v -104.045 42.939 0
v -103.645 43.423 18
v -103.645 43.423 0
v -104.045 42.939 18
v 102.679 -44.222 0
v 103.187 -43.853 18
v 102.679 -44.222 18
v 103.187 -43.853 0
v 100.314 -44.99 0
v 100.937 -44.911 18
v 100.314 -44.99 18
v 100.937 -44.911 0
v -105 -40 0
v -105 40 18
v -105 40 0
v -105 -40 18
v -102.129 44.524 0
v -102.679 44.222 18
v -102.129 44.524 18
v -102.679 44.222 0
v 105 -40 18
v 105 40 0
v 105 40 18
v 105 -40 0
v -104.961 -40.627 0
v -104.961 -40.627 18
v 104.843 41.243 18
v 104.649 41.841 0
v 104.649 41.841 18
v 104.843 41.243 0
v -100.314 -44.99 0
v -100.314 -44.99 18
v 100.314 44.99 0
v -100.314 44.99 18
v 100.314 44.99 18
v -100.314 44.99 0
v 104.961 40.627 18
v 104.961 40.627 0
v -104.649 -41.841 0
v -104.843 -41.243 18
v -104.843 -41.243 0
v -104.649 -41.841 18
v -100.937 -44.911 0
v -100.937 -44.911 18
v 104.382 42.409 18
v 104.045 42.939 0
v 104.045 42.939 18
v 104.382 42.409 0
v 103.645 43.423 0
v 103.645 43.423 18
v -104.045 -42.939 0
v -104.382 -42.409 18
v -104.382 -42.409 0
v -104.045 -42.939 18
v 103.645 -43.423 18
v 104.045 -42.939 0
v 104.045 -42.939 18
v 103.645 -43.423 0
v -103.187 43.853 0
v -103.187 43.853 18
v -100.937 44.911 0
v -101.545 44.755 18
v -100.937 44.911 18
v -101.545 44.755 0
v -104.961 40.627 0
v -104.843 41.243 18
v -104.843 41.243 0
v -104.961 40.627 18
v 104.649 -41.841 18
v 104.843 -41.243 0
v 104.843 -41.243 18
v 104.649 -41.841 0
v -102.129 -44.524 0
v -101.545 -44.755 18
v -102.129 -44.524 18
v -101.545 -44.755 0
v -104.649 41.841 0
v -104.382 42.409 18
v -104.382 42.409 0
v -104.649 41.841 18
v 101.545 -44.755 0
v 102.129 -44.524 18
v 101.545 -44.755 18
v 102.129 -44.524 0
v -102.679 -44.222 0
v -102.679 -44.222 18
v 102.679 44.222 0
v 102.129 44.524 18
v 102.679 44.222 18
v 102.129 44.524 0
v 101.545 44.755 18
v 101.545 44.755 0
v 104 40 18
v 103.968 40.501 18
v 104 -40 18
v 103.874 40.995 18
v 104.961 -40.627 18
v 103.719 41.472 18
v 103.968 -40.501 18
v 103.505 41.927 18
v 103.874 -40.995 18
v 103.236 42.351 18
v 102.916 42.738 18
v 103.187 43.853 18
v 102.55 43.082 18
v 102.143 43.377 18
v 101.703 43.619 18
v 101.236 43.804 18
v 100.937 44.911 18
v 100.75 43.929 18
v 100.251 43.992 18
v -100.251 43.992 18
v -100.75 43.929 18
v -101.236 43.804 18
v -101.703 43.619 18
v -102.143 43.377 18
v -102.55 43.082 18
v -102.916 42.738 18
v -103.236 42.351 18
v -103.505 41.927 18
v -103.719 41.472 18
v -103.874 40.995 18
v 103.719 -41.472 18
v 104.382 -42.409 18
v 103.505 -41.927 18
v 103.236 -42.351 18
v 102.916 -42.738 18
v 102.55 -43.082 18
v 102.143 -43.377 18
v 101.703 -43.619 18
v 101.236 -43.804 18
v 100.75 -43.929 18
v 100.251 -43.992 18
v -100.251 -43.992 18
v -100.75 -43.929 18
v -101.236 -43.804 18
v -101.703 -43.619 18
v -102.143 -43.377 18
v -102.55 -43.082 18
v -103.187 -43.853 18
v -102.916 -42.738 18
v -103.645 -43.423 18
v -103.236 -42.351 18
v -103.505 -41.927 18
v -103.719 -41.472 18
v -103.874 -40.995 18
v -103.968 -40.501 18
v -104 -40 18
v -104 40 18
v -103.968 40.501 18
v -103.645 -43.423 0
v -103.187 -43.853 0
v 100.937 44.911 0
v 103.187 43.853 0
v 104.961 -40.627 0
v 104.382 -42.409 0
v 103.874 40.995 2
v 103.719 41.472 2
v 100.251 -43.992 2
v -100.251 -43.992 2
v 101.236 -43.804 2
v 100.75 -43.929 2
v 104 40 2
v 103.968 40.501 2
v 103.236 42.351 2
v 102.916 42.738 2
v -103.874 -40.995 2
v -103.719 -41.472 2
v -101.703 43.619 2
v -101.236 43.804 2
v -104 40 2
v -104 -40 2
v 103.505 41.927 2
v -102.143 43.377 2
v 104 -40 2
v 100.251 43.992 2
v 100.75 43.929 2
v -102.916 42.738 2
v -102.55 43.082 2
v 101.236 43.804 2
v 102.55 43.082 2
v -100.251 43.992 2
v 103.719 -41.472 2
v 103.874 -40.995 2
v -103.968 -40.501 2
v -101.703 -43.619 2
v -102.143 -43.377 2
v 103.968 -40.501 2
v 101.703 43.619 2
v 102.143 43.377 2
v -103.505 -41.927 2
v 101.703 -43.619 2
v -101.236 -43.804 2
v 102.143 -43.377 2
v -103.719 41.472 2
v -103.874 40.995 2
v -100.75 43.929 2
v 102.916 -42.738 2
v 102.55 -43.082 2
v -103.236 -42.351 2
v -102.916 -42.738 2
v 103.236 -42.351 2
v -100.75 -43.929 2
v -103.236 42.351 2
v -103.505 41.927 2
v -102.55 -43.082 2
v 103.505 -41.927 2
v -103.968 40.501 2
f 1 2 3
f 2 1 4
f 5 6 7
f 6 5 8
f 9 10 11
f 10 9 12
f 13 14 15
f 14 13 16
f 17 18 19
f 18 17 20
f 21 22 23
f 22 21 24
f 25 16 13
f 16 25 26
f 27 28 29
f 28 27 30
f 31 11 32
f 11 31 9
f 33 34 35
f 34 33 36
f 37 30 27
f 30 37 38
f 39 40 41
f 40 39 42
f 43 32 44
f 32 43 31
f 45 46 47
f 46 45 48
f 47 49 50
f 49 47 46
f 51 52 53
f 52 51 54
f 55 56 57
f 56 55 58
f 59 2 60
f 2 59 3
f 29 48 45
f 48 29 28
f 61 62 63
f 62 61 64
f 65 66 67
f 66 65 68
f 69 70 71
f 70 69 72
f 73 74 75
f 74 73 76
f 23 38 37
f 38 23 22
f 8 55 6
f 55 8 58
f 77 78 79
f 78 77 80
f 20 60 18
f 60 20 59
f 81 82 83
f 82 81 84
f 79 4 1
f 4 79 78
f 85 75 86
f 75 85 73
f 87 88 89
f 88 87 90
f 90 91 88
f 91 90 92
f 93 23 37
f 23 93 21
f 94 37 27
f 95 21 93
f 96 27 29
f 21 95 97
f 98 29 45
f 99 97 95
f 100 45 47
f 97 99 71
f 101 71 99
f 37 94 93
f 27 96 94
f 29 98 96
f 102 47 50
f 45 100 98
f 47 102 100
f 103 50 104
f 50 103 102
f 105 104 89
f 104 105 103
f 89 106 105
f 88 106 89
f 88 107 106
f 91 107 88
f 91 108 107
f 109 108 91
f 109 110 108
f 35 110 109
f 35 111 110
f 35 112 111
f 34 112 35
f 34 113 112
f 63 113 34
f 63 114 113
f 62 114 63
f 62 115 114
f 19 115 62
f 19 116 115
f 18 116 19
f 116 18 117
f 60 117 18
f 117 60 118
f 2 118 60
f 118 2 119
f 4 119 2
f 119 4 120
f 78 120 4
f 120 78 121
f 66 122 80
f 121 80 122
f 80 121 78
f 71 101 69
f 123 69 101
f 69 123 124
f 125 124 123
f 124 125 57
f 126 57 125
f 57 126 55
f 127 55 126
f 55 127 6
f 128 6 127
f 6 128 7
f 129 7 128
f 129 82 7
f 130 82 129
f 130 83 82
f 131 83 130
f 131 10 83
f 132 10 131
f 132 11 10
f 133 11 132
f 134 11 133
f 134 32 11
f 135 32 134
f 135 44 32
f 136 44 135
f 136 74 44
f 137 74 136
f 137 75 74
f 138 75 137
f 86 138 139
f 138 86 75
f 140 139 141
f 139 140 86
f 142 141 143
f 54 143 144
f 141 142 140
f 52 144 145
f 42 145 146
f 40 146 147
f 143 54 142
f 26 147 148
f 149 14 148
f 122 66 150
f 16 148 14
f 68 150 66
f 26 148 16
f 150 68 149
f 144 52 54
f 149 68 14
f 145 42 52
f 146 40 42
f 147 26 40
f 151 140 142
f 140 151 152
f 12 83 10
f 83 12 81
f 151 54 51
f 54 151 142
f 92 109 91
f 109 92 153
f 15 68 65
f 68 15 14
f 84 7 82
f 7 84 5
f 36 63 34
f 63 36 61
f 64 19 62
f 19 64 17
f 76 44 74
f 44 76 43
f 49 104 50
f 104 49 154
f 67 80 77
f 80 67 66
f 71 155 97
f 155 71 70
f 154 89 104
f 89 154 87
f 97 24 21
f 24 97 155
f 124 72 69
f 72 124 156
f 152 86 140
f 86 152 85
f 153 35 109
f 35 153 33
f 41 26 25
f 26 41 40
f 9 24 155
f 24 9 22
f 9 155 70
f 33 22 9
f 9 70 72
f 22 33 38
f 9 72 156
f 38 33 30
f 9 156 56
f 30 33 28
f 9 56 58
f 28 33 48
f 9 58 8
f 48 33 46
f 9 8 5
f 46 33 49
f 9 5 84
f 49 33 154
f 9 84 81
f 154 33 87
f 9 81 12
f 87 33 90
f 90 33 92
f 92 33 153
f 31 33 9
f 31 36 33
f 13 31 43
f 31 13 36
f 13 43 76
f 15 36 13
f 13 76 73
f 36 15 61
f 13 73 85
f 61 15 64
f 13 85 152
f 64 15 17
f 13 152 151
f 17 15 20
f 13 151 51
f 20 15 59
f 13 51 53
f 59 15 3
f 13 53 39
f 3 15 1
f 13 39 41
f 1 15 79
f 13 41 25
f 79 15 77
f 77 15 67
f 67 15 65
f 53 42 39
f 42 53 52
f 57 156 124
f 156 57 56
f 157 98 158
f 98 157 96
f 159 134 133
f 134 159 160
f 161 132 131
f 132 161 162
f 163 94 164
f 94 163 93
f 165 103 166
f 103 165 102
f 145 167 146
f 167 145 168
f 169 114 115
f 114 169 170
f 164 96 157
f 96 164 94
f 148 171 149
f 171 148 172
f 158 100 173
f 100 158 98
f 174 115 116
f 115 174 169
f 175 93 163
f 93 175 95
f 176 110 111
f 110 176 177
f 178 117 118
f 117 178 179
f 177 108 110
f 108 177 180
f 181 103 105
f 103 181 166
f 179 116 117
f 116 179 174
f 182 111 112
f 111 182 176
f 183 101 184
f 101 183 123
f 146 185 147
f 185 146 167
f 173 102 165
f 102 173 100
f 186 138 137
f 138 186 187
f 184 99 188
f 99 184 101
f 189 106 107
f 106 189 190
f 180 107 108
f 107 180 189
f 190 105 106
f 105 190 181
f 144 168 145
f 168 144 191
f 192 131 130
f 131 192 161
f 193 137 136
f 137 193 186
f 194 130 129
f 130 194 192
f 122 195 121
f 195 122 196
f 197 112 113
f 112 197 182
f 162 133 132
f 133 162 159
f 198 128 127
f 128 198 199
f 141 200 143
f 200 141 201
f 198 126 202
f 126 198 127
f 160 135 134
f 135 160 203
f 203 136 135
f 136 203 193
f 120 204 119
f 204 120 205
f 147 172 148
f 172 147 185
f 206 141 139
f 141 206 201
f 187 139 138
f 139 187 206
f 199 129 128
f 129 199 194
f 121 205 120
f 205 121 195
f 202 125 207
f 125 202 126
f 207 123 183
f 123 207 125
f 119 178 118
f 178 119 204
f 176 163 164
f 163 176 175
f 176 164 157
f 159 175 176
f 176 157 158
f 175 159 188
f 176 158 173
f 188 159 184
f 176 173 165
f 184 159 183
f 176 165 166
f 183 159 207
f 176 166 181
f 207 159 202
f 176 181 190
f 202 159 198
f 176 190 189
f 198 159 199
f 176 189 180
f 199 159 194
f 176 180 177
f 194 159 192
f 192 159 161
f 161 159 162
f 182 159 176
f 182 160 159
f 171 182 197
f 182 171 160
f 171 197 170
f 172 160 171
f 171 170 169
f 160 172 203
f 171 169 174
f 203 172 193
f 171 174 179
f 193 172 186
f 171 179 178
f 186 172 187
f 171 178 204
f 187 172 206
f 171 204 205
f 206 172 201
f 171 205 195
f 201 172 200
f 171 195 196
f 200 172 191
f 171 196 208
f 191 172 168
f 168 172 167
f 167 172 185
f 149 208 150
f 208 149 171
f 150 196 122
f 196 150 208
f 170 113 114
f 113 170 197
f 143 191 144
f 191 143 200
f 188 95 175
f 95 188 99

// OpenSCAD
$fn = 50;


difference() {
	union() {
		hull() {
			translate(v = [-100.0000000000, 40.0000000000, 0]) {
				cylinder(h = 18, r = 5);
			}
			translate(v = [100.0000000000, 40.0000000000, 0]) {
				cylinder(h = 18, r = 5);
			}
			translate(v = [-100.0000000000, -40.0000000000, 0]) {
				cylinder(h = 18, r = 5);
			}
			translate(v = [100.0000000000, -40.0000000000, 0]) {
				cylinder(h = 18, r = 5);
			}
		}
	}
	union() {
		translate(v = [0, 0, 2]) {
			hull() {
				translate(v = [-100.0000000000, 40.0000000000, 0]) {
					cylinder(h = 16, r = 4);
				}
				translate(v = [100.0000000000, 40.0000000000, 0]) {
					cylinder(h = 16, r = 4);
				}
				translate(v = [-100.0000000000, -40.0000000000, 0]) {
					cylinder(h = 16, r = 4);
				}
				translate(v = [100.0000000000, -40.0000000000, 0]) {
					cylinder(h = 16, r = 4);
				}
			}
		}
	}
}
